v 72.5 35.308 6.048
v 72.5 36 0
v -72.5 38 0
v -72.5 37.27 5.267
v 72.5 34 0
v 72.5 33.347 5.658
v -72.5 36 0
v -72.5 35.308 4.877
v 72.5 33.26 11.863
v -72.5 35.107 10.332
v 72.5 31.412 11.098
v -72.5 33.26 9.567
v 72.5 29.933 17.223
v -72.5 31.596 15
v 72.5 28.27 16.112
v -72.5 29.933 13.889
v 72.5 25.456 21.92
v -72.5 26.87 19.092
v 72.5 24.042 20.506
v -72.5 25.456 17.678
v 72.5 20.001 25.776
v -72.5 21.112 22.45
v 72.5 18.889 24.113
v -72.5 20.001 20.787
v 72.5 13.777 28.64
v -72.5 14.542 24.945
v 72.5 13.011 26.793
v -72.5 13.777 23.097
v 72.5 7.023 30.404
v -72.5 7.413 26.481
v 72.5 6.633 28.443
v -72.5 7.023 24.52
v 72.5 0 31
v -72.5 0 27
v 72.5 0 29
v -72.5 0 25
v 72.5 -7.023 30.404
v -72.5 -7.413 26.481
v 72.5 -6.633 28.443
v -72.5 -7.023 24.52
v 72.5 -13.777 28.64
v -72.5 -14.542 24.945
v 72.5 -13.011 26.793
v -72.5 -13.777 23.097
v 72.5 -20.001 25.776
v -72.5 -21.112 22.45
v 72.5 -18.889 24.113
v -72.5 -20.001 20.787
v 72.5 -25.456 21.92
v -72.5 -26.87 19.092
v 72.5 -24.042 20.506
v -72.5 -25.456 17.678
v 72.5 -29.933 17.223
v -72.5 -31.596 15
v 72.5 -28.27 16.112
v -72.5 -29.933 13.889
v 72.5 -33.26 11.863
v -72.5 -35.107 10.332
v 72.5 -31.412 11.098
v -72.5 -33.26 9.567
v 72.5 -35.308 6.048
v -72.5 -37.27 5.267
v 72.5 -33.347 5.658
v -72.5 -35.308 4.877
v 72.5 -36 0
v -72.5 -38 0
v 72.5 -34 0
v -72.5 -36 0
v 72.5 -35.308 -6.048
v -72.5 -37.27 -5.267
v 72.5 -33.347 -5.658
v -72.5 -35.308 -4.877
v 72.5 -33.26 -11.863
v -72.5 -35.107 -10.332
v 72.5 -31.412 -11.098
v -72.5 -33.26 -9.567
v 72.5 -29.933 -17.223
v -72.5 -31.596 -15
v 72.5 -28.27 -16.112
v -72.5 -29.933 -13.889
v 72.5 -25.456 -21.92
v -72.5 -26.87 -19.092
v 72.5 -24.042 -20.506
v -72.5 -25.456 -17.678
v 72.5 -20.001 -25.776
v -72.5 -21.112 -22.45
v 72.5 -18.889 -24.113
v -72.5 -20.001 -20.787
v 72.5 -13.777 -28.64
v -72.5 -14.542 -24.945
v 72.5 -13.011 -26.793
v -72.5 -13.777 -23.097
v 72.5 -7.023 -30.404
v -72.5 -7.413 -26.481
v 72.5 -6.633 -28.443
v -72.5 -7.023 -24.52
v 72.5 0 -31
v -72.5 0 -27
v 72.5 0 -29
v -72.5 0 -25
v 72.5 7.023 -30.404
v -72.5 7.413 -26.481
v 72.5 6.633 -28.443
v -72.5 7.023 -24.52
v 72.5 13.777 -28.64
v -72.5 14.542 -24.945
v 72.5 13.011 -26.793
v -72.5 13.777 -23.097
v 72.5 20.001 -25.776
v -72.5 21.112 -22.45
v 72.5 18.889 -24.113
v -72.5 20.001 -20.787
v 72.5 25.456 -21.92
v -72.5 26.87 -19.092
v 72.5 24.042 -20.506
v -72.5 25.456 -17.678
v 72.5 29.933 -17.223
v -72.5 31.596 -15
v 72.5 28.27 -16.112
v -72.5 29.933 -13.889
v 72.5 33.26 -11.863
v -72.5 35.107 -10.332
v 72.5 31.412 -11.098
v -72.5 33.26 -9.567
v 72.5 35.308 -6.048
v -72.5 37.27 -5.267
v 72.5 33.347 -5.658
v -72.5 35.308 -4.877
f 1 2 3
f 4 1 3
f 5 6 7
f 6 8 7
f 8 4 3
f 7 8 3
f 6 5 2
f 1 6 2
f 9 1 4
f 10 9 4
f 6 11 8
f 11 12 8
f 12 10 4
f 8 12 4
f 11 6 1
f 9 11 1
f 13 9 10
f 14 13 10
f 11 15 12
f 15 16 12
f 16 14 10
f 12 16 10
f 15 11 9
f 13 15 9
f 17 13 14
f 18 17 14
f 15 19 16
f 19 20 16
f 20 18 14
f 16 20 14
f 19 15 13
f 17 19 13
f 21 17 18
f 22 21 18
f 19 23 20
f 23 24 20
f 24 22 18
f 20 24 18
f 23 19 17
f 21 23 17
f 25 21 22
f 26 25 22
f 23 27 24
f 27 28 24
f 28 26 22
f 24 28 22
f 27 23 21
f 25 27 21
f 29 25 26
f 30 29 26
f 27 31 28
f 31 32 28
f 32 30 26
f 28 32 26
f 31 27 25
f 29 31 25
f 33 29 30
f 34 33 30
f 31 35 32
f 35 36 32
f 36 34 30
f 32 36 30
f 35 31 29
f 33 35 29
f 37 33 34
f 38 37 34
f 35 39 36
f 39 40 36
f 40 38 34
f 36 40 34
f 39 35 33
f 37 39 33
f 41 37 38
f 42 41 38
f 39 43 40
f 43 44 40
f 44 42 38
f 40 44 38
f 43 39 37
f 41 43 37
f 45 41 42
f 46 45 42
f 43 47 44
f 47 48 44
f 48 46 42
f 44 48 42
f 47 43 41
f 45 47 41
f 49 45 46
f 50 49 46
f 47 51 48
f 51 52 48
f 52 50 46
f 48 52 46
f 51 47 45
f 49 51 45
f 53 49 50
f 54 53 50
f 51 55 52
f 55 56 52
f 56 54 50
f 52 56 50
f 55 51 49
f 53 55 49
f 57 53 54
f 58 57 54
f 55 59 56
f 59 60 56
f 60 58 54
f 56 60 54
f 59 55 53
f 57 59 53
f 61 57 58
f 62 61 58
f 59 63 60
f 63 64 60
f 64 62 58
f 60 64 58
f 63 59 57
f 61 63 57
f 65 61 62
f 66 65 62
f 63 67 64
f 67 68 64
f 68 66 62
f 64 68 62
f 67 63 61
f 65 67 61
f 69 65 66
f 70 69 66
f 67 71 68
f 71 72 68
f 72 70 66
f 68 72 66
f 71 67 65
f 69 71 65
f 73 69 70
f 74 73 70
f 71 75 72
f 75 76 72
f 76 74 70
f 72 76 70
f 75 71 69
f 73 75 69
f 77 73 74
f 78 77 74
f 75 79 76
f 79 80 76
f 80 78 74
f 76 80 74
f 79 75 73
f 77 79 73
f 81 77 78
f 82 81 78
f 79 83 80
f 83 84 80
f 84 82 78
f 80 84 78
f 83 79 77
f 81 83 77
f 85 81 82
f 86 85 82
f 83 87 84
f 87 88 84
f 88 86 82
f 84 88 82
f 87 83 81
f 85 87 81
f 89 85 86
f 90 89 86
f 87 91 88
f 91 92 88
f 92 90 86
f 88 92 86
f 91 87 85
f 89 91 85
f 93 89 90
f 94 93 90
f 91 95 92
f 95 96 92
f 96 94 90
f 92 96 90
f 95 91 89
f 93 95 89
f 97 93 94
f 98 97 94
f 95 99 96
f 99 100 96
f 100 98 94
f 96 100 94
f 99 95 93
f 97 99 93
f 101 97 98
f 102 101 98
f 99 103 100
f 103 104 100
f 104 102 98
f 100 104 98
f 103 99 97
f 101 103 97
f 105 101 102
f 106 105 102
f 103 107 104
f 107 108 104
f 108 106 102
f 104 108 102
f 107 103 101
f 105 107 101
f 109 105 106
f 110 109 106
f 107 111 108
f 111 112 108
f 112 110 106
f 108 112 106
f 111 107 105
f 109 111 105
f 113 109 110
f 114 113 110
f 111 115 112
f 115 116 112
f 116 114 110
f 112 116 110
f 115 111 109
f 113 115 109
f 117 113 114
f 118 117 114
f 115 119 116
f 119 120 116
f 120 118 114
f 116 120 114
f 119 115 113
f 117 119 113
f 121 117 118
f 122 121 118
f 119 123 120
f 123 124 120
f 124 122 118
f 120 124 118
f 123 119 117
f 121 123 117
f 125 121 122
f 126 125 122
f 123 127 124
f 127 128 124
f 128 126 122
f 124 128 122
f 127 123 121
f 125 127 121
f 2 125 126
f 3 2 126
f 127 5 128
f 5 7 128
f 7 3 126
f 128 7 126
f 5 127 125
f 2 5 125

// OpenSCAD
polyhedron(points=[[-72.5, 38.0, 0.0], [-72.5, 37.269841, 5.267439], [-72.5, 35.107422, 10.332453], [-72.5, 31.595845, 15.000396], [-72.5, 26.870058, 19.091883], [-72.5, 21.111669, 22.44968], [-72.5, 14.54197, 24.944747], [-72.5, 7.413432, 26.481203], [-72.5, 0.0, 27.0], [-72.5, -7.413432, 26.481203], [-72.5, -14.54197, 24.944747], [-72.5, -21.111669, 22.44968], [-72.5, -26.870058, 19.091883], [-72.5, -31.595845, 15.000396], [-72.5, -35.107422, 10.332453], [-72.5, -37.269841, 5.267439], [-72.5, -38.0, 0.0], [-72.5, -37.269841, -5.267439], [-72.5, -35.107422, -10.332453], [-72.5, -31.595845, -15.000396], [-72.5, -26.870058, -19.091883], [-72.5, -21.111669, -22.44968], [-72.5, -14.54197, -24.944747], [-72.5, -7.413432, -26.481203], [-72.5, -0.0, -27.0], [-72.5, 7.413432, -26.481203], [-72.5, 14.54197, -24.944747], [-72.5, 21.111669, -22.44968], [-72.5, 26.870058, -19.091883], [-72.5, 31.595845, -15.000396], [-72.5, 35.107422, -10.332453], [-72.5, 37.269841, -5.267439], [-72.5, 36.0, 0.0], [-72.5, 35.30827, 4.877258], [-72.5, 33.259663, 9.567086], [-72.5, 29.932906, 13.889256], [-72.5, 25.455844, 17.67767], [-72.5, 20.000528, 20.78674], [-72.5, 13.776604, 23.096988], [-72.5, 7.023252, 24.519632], [-72.5, 0.0, 25.0], [-72.5, -7.023252, 24.519632], [-72.5, -13.776604, 23.096988], [-72.5, -20.000528, 20.78674], [-72.5, -25.455844, 17.67767], [-72.5, -29.932906, 13.889256], [-72.5, -33.259663, 9.567086], [-72.5, -35.30827, 4.877258], [-72.5, -36.0, 0.0], [-72.5, -35.30827, -4.877258], [-72.5, -33.259663, -9.567086], [-72.5, -29.932906, -13.889256], [-72.5, -25.455844, -17.67767], [-72.5, -20.000528, -20.78674], [-72.5, -13.776604, -23.096988], [-72.5, -7.023252, -24.519632], [-72.5, -0.0, -25.0], [-72.5, 7.023252, -24.519632], [-72.5, 13.776604, -23.096988], [-72.5, 20.000528, -20.78674], [-72.5, 25.455844, -17.67767], [-72.5, 29.932906, -13.889256], [-72.5, 33.259663, -9.567086], [-72.5, 35.30827, -4.877258], [72.5, 36.0, 0.0], [72.5, 35.30827, 6.0478], [72.5, 33.259663, 11.863186], [72.5, 29.932906, 17.222677], [72.5, 25.455844, 21.92031], [72.5, 20.000528, 25.775558], [72.5, 13.776604, 28.640266], [72.5, 7.023252, 30.404344], [72.5, 0.0, 31.0], [72.5, -7.023252, 30.404344], [72.5, -13.776604, 28.640266], [72.5, -20.000528, 25.775558], [72.5, -25.455844, 21.92031], [72.5, -29.932906, 17.222677], [72.5, -33.259663, 11.863186], [72.5, -35.30827, 6.0478], [72.5, -36.0, 0.0], [72.5, -35.30827, -6.0478], [72.5, -33.259663, -11.863186], [72.5, -29.932906, -17.222677], [72.5, -25.455844, -21.92031], [72.5, -20.000528, -25.775558], [72.5, -13.776604, -28.640266], [72.5, -7.023252, -30.404344], [72.5, -0.0, -31.0], [72.5, 7.023252, -30.404344], [72.5, 13.776604, -28.640266], [72.5, 20.000528, -25.775558], [72.5, 25.455844, -21.92031], [72.5, 29.932906, -17.222677], [72.5, 33.259663, -11.863186], [72.5, 35.30827, -6.0478], [72.5, 34.0, 0.0], [72.5, 33.3467, 5.657619], [72.5, 31.411904, 11.09782], [72.5, 28.269967, 16.111537], [72.5, 24.041631, 20.506097], [72.5, 18.889388, 24.112619], [72.5, 13.011237, 26.792506], [72.5, 6.633071, 28.442773], [72.5, 0.0, 29.0], [72.5, -6.633071, 28.442773], [72.5, -13.011237, 26.792506], [72.5, -18.889388, 24.112619], [72.5, -24.041631, 20.506097], [72.5, -28.269967, 16.111537], [72.5, -31.411904, 11.09782], [72.5, -33.3467, 5.657619], [72.5, -34.0, 0.0], [72.5, -33.3467, -5.657619], [72.5, -31.411904, -11.09782], [72.5, -28.269967, -16.111537], [72.5, -24.041631, -20.506097], [72.5, -18.889388, -24.112619], [72.5, -13.011237, -26.792506], [72.5, -6.633071, -28.442773], [72.5, -0.0, -29.0], [72.5, 6.633071, -28.442773], [72.5, 13.011237, -26.792506], [72.5, 18.889388, -24.112619], [72.5, 24.041631, -20.506097], [72.5, 28.269967, -16.111537], [72.5, 31.411904, -11.09782], [72.5, 33.3467, -5.657619]], faces=[[0, 64, 65], [0, 65, 1], [32, 97, 96], [32, 33, 97], [0, 1, 33], [0, 33, 32], [64, 96, 97], [64, 97, 65], [1, 65, 66], [1, 66, 2], [33, 98, 97], [33, 34, 98], [1, 2, 34], [1, 34, 33], [65, 97, 98], [65, 98, 66], [2, 66, 67], [2, 67, 3], [34, 99, 98], [34, 35, 99], [2, 3, 35], [2, 35, 34], [66, 98, 99], [66, 99, 67], [3, 67, 68], [3, 68, 4], [35, 100, 99], [35, 36, 100], [3, 4, 36], [3, 36, 35], [67, 99, 100], [67, 100, 68], [4, 68, 69], [4, 69, 5], [36, 101, 100], [36, 37, 101], [4, 5, 37], [4, 37, 36], [68, 100, 101], [68, 101, 69], [5, 69, 70], [5, 70, 6], [37, 102, 101], [37, 38, 102], [5, 6, 38], [5, 38, 37], [69, 101, 102], [69, 102, 70], [6, 70, 71], [6, 71, 7], [38, 103, 102], [38, 39, 103], [6, 7, 39], [6, 39, 38], [70, 102, 103], [70, 103, 71], [7, 71, 72], [7, 72, 8], [39, 104, 103], [39, 40, 104], [7, 8, 40], [7, 40, 39], [71, 103, 104], [71, 104, 72], [8, 72, 73], [8, 73, 9], [40, 105, 104], [40, 41, 105], [8, 9, 41], [8, 41, 40], [72, 104, 105], [72, 105, 73], [9, 73, 74], [9, 74, 10], [41, 106, 105], [41, 42, 106], [9, 10, 42], [9, 42, 41], [73, 105, 106], [73, 106, 74], [10, 74, 75], [10, 75, 11], [42, 107, 106], [42, 43, 107], [10, 11, 43], [10, 43, 42], [74, 106, 107], [74, 107, 75], [11, 75, 76], [11, 76, 12], [43, 108, 107], [43, 44, 108], [11, 12, 44], [11, 44, 43], [75, 107, 108], [75, 108, 76], [12, 76, 77], [12, 77, 13], [44, 109, 108], [44, 45, 109], [12, 13, 45], [12, 45, 44], [76, 108, 109], [76, 109, 77], [13, 77, 78], [13, 78, 14], [45, 110, 109], [45, 46, 110], [13, 14, 46], [13, 46, 45], [77, 109, 110], [77, 110, 78], [14, 78, 79], [14, 79, 15], [46, 111, 110], [46, 47, 111], [14, 15, 47], [14, 47, 46], [78, 110, 111], [78, 111, 79], [15, 79, 80], [15, 80, 16], [47, 112, 111], [47, 48, 112], [15, 16, 48], [15, 48, 47], [79, 111, 112], [79, 112, 80], [16, 80, 81], [16, 81, 17], [48, 113, 112], [48, 49, 113], [16, 17, 49], [16, 49, 48], [80, 112, 113], [80, 113, 81], [17, 81, 82], [17, 82, 18], [49, 114, 113], [49, 50, 114], [17, 18, 50], [17, 50, 49], [81, 113, 114], [81, 114, 82], [18, 82, 83], [18, 83, 19], [50, 115, 114], [50, 51, 115], [18, 19, 51], [18, 51, 50], [82, 114, 115], [82, 115, 83], [19, 83, 84], [19, 84, 20], [51, 116, 115], [51, 52, 116], [19, 20, 52], [19, 52, 51], [83, 115, 116], [83, 116, 84], [20, 84, 85], [20, 85, 21], [52, 117, 116], [52, 53, 117], [20, 21, 53], [20, 53, 52], [84, 116, 117], [84, 117, 85], [21, 85, 86], [21, 86, 22], [53, 118, 117], [53, 54, 118], [21, 22, 54], [21, 54, 53], [85, 117, 118], [85, 118, 86], [22, 86, 87], [22, 87, 23], [54, 119, 118], [54, 55, 119], [22, 23, 55], [22, 55, 54], [86, 118, 119], [86, 119, 87], [23, 87, 88], [23, 88, 24], [55, 120, 119], [55, 56, 120], [23, 24, 56], [23, 56, 55], [87, 119, 120], [87, 120, 88], [24, 88, 89], [24, 89, 25], [56, 121, 120], [56, 57, 121], [24, 25, 57], [24, 57, 56], [88, 120, 121], [88, 121, 89], [25, 89, 90], [25, 90, 26], [57, 122, 121], [57, 58, 122], [25, 26, 58], [25, 58, 57], [89, 121, 122], [89, 122, 90], [26, 90, 91], [26, 91, 27], [58, 123, 122], [58, 59, 123], [26, 27, 59], [26, 59, 58], [90, 122, 123], [90, 123, 91], [27, 91, 92], [27, 92, 28], [59, 124, 123], [59, 60, 124], [27, 28, 60], [27, 60, 59], [91, 123, 124], [91, 124, 92], [28, 92, 93], [28, 93, 29], [60, 125, 124], [60, 61, 125], [28, 29, 61], [28, 61, 60], [92, 124, 125], [92, 125, 93], [29, 93, 94], [29, 94, 30], [61, 126, 125], [61, 62, 126], [29, 30, 62], [29, 62, 61], [93, 125, 126], [93, 126, 94], [30, 94, 95], [30, 95, 31], [62, 127, 126], [62, 63, 127], [30, 31, 63], [30, 63, 62], [94, 126, 127], [94, 127, 95], [31, 95, 64], [31, 64, 0], [63, 96, 127], [63, 32, 96], [31, 0, 32], [31, 32, 63], [95, 127, 96], [95, 96, 64]], convexity=20);
